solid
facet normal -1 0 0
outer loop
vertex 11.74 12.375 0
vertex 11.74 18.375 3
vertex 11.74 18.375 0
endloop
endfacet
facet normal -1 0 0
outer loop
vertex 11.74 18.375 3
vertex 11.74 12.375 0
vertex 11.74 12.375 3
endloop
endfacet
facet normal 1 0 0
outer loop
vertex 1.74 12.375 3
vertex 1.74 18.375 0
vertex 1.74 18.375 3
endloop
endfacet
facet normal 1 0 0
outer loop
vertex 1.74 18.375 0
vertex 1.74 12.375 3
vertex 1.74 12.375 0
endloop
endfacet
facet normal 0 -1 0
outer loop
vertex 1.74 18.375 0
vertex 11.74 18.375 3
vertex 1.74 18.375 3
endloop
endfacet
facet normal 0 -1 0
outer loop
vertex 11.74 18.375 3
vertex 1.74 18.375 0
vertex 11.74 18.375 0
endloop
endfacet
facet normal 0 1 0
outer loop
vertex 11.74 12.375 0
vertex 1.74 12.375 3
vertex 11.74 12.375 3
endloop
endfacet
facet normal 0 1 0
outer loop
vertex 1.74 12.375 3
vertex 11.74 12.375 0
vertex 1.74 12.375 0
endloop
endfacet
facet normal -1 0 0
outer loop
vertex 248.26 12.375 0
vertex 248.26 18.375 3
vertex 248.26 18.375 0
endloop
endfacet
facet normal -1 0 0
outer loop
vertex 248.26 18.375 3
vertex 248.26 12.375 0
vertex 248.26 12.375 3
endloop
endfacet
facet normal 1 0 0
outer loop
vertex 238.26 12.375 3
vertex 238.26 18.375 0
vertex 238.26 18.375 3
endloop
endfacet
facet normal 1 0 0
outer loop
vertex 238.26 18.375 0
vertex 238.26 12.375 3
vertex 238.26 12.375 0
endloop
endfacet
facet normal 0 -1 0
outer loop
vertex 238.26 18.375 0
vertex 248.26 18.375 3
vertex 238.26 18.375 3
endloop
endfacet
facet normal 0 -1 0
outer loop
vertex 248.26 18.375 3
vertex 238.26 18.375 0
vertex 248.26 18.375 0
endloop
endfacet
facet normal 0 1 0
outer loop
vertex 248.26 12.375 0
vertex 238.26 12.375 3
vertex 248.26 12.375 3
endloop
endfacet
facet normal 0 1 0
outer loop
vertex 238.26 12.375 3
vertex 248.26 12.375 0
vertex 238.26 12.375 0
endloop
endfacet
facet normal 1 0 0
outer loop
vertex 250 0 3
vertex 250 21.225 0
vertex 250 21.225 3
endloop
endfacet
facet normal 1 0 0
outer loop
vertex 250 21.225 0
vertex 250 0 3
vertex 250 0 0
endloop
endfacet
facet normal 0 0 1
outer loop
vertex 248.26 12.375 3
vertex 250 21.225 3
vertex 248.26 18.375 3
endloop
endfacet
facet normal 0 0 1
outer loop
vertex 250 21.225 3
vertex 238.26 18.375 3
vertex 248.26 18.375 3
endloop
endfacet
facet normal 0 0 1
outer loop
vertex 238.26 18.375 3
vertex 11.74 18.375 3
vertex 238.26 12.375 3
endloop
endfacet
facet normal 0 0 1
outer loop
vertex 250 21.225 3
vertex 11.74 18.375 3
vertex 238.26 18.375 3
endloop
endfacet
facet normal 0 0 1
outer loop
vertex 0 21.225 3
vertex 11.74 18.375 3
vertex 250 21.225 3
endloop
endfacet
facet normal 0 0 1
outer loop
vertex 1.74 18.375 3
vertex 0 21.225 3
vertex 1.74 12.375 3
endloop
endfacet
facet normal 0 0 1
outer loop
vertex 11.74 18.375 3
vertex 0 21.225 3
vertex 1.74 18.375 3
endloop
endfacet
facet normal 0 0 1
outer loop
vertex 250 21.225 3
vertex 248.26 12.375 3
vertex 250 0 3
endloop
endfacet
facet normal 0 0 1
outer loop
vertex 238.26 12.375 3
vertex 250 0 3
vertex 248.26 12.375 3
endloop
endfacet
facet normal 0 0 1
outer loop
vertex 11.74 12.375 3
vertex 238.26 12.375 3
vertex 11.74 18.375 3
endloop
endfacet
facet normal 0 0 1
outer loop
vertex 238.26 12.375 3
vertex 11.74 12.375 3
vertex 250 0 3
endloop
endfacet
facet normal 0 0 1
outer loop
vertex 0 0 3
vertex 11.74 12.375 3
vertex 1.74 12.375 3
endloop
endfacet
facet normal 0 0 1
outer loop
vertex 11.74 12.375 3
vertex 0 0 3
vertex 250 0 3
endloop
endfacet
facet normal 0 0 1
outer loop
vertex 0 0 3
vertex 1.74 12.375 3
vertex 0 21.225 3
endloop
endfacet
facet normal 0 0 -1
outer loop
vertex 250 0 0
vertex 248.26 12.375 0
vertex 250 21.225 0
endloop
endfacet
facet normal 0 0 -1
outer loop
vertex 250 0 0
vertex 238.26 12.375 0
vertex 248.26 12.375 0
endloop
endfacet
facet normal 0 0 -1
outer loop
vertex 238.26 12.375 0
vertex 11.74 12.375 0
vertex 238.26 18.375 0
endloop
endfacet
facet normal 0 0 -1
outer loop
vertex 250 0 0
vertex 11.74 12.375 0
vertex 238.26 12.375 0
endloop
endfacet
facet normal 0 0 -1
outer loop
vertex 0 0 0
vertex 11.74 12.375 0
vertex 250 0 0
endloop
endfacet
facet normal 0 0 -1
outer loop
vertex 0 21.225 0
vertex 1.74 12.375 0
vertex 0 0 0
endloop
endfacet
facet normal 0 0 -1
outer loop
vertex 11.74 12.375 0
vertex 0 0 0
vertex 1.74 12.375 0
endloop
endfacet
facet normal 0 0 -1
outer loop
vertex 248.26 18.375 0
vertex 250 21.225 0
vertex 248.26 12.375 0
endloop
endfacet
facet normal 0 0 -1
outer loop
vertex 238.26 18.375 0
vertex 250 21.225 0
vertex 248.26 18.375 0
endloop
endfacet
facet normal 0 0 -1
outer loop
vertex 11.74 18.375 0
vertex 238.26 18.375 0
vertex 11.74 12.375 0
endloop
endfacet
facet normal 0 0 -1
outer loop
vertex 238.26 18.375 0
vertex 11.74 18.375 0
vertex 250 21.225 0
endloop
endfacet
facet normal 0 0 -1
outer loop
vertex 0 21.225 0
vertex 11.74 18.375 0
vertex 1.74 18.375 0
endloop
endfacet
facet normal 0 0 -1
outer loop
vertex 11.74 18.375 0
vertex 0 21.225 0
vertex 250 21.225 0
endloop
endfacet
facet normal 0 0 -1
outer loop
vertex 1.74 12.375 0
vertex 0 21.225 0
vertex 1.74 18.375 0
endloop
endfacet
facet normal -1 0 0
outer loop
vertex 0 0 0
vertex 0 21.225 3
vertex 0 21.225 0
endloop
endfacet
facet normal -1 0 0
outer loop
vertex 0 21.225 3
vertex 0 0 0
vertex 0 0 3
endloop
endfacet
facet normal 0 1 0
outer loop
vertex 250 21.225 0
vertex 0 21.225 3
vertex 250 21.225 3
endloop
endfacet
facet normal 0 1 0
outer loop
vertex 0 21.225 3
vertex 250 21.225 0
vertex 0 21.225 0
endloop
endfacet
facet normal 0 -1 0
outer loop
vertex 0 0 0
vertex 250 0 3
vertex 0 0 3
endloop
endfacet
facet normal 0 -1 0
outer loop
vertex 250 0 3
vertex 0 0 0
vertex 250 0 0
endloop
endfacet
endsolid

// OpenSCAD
// TL1_Plate_0p5U_Shifted_0p5U
// Homelab Rack CAD Standard v1.0 - millimeters
// Mount positions provisional: test-fit against DeskPi TL1 rail!
plate_width=250;
plate_height=21.225;
plate_thickness=3;
slot_width=10;
slot_height=6;
slot_x=[6.74,243.26];
slot_y=[15.375];
difference() {
  cube([plate_width,plate_height,plate_thickness]);
  for (x=slot_x) for (y=slot_y)
    translate([x-slot_width/2,y-slot_height/2,-0.5])
      cube([slot_width,slot_height,plate_thickness+1]);
}
